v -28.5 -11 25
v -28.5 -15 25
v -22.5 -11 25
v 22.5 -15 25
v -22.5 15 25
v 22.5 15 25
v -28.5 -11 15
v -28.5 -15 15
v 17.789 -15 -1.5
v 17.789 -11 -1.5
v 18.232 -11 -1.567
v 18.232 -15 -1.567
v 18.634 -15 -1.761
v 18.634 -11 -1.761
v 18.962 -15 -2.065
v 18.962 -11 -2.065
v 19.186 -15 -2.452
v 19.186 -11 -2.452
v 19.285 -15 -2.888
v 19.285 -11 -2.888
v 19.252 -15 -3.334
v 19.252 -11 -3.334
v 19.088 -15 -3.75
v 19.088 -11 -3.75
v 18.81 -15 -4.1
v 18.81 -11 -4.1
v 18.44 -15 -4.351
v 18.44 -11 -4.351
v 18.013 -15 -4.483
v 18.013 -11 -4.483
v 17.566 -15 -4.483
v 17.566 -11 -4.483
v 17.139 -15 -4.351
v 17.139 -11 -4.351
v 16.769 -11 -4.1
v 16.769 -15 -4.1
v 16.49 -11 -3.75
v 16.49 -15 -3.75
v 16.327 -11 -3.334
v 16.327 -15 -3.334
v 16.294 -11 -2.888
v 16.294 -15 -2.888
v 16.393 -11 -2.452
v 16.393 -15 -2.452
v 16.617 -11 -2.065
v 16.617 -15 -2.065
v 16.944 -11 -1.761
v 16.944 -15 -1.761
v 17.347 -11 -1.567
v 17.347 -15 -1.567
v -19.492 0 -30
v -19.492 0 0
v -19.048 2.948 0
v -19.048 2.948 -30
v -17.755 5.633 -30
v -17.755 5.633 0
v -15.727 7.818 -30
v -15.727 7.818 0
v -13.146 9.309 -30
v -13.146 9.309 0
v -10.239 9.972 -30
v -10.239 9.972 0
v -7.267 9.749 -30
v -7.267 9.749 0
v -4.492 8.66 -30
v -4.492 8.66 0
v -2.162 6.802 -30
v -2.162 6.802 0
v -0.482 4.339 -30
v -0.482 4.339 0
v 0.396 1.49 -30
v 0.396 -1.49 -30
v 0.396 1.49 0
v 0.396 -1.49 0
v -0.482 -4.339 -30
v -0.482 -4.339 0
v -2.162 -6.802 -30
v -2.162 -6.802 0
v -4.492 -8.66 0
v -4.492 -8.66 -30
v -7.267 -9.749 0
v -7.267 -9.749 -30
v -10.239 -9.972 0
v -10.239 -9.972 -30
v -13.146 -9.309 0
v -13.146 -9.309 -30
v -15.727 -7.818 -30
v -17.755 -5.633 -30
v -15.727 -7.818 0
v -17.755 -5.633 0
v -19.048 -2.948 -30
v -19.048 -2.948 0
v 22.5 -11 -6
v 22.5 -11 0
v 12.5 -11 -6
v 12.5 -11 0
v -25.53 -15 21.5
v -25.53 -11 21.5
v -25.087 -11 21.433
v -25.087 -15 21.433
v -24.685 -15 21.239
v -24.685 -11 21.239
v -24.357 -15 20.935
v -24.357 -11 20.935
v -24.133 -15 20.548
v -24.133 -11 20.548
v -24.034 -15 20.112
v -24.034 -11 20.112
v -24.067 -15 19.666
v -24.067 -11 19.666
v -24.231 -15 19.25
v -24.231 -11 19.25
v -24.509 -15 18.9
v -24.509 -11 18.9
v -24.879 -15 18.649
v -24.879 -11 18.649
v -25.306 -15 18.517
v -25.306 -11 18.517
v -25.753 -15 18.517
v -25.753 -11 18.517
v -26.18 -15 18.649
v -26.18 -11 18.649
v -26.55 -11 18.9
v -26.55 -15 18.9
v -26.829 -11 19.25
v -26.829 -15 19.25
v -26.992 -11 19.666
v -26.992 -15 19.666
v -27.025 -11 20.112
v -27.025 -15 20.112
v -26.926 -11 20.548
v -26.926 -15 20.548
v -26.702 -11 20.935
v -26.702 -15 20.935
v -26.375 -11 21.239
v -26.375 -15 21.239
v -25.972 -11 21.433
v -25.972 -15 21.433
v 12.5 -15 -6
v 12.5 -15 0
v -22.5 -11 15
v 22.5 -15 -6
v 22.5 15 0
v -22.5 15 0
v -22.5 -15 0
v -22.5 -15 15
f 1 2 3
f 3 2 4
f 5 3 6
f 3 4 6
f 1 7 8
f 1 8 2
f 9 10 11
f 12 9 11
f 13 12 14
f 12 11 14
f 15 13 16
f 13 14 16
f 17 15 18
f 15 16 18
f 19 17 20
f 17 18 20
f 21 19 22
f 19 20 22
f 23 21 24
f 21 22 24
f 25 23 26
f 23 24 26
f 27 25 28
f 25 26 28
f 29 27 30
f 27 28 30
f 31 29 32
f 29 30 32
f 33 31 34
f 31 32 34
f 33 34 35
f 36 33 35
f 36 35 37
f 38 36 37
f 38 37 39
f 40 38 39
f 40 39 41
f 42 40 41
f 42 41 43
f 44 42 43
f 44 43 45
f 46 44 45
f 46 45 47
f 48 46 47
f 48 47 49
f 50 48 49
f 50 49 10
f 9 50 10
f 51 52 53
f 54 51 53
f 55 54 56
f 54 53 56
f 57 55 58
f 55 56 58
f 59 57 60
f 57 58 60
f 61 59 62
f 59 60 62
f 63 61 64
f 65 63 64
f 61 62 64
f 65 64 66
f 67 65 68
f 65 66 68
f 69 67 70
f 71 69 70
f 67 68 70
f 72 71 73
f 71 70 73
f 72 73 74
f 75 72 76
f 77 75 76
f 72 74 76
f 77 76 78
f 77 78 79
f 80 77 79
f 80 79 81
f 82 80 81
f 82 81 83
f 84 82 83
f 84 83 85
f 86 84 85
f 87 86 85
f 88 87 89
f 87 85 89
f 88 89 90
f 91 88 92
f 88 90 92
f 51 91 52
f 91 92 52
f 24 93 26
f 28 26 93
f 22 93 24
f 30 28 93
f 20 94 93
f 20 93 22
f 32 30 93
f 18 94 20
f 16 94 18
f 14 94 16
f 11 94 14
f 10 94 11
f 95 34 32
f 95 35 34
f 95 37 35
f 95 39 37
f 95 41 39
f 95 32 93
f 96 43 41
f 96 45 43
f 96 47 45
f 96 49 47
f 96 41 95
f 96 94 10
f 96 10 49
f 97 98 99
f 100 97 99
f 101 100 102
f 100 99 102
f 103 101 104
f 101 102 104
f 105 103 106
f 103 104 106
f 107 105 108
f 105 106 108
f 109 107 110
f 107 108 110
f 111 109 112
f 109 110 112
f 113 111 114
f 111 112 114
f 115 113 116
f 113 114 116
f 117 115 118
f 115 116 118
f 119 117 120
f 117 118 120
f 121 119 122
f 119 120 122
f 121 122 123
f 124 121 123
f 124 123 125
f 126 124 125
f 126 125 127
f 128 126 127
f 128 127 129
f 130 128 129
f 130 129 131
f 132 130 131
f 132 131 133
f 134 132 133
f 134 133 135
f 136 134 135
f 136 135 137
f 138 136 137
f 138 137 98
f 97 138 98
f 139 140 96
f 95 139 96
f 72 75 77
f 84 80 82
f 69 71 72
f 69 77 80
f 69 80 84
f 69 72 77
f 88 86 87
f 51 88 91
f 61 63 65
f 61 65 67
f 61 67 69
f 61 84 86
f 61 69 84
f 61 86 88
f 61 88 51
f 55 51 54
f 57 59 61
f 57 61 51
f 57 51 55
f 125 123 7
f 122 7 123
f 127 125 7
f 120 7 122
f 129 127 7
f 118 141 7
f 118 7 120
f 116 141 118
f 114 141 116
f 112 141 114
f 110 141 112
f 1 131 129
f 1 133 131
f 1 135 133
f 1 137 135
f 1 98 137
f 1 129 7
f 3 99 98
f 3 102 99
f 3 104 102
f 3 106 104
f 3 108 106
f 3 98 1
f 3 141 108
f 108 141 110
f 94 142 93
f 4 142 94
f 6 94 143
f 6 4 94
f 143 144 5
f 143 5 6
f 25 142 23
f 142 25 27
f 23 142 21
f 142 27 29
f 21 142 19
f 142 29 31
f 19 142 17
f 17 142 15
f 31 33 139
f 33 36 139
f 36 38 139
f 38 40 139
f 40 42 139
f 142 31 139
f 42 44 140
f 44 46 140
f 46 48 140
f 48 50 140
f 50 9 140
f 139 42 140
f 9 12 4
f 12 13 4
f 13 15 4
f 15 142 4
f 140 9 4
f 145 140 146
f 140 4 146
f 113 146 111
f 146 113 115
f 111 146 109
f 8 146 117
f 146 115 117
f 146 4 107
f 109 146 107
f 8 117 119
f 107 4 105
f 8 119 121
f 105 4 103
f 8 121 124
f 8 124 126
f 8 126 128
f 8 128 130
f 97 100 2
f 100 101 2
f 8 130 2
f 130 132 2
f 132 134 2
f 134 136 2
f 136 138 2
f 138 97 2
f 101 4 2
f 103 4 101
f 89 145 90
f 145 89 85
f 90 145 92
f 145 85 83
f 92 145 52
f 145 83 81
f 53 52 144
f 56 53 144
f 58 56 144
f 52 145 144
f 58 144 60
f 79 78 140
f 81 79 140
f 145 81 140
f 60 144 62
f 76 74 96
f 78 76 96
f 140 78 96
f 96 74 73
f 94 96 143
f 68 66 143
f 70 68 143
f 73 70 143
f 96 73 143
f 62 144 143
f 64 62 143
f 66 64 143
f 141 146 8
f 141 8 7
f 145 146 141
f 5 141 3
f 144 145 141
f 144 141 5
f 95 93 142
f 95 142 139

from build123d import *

# Parameters (mm, degrees)
ESQUISSE1_W             = 45
ESQUISSE1_H             = 30
BOSS_EXTRU_1_DEPTH      = 25
ESQUISSE2_R             = 10
BOSS_EXTRU_2_DEPTH      = 30
ESQUISSE3_W             = 10
ESQUISSE3_H             = 4
BOSS_EXTRU_3_DEPTH      = 6
ESQUISSE4_R             = 1.5
ENL_V_MAT_EXTRU_1_DEPTH = 6
ESQUISSE6_W             = 10
ESQUISSE6_H             = 4
BOSS_EXTRU_4_DEPTH      = 6
ESQUISSE7_R             = 1.5
ENL_V_MAT_EXTRU_2_DEPTH = 6


with BuildPart() as part:
    # Esquisse1 → Boss.-Extru.1 (new body)
    with BuildSketch(Plane.XY):
        Rectangle(ESQUISSE1_W, ESQUISSE1_H)
    extrude(amount=BOSS_EXTRU_1_DEPTH)

    # Esquisse2 → Boss.-Extru.2 (add)
    with BuildSketch(Plane(origin=(0, 0, 0), x_dir=(-1, 0, 0), z_dir=(0, 0, -1))):
        with Locations((9.492124495, 0)):
            Circle(ESQUISSE2_R)
    extrude(amount=BOSS_EXTRU_2_DEPTH)

    # Esquisse3 → Boss.-Extru.3 (add)
    with BuildSketch(Plane.ZY.offset(22.5)):
        with Locations((20, -13)):
            Rectangle(ESQUISSE3_W, ESQUISSE3_H)
    extrude(amount=BOSS_EXTRU_3_DEPTH)

    # Esquisse4 → Enlèv. mat.-Extru.1 (cut)
    with BuildSketch(Plane(origin=(0, -11, 0), x_dir=(1, 0, 0), z_dir=(0, 1, 0))):
        with Locations(Location((-25.529560032, -20, 0), (0, 0, 270))):
            Circle(ESQUISSE4_R)
    extrude(amount=-ENL_V_MAT_EXTRU_1_DEPTH, mode=Mode.SUBTRACT)

    # Esquisse6 → Boss.-Extru.4 (add)
    with BuildSketch(Plane(origin=(0, 0, 0), x_dir=(-1, 0, 0), z_dir=(0, 0, -1))):
        with Locations((-17.5, -13)):
            Rectangle(ESQUISSE6_W, ESQUISSE6_H)
    extrude(amount=BOSS_EXTRU_4_DEPTH)

    # Esquisse7 → Enlèv. mat.-Extru.2 (cut)
    with BuildSketch(Plane(origin=(0, -11, 0), x_dir=(1, 0, 0), z_dir=(0, 1, 0))):
        with Locations(Location((17.789413963, 3, 0), (0, 0, 270))):
            Circle(ESQUISSE7_R)
    extrude(amount=-ENL_V_MAT_EXTRU_2_DEPTH, mode=Mode.SUBTRACT)


solid = part.part
